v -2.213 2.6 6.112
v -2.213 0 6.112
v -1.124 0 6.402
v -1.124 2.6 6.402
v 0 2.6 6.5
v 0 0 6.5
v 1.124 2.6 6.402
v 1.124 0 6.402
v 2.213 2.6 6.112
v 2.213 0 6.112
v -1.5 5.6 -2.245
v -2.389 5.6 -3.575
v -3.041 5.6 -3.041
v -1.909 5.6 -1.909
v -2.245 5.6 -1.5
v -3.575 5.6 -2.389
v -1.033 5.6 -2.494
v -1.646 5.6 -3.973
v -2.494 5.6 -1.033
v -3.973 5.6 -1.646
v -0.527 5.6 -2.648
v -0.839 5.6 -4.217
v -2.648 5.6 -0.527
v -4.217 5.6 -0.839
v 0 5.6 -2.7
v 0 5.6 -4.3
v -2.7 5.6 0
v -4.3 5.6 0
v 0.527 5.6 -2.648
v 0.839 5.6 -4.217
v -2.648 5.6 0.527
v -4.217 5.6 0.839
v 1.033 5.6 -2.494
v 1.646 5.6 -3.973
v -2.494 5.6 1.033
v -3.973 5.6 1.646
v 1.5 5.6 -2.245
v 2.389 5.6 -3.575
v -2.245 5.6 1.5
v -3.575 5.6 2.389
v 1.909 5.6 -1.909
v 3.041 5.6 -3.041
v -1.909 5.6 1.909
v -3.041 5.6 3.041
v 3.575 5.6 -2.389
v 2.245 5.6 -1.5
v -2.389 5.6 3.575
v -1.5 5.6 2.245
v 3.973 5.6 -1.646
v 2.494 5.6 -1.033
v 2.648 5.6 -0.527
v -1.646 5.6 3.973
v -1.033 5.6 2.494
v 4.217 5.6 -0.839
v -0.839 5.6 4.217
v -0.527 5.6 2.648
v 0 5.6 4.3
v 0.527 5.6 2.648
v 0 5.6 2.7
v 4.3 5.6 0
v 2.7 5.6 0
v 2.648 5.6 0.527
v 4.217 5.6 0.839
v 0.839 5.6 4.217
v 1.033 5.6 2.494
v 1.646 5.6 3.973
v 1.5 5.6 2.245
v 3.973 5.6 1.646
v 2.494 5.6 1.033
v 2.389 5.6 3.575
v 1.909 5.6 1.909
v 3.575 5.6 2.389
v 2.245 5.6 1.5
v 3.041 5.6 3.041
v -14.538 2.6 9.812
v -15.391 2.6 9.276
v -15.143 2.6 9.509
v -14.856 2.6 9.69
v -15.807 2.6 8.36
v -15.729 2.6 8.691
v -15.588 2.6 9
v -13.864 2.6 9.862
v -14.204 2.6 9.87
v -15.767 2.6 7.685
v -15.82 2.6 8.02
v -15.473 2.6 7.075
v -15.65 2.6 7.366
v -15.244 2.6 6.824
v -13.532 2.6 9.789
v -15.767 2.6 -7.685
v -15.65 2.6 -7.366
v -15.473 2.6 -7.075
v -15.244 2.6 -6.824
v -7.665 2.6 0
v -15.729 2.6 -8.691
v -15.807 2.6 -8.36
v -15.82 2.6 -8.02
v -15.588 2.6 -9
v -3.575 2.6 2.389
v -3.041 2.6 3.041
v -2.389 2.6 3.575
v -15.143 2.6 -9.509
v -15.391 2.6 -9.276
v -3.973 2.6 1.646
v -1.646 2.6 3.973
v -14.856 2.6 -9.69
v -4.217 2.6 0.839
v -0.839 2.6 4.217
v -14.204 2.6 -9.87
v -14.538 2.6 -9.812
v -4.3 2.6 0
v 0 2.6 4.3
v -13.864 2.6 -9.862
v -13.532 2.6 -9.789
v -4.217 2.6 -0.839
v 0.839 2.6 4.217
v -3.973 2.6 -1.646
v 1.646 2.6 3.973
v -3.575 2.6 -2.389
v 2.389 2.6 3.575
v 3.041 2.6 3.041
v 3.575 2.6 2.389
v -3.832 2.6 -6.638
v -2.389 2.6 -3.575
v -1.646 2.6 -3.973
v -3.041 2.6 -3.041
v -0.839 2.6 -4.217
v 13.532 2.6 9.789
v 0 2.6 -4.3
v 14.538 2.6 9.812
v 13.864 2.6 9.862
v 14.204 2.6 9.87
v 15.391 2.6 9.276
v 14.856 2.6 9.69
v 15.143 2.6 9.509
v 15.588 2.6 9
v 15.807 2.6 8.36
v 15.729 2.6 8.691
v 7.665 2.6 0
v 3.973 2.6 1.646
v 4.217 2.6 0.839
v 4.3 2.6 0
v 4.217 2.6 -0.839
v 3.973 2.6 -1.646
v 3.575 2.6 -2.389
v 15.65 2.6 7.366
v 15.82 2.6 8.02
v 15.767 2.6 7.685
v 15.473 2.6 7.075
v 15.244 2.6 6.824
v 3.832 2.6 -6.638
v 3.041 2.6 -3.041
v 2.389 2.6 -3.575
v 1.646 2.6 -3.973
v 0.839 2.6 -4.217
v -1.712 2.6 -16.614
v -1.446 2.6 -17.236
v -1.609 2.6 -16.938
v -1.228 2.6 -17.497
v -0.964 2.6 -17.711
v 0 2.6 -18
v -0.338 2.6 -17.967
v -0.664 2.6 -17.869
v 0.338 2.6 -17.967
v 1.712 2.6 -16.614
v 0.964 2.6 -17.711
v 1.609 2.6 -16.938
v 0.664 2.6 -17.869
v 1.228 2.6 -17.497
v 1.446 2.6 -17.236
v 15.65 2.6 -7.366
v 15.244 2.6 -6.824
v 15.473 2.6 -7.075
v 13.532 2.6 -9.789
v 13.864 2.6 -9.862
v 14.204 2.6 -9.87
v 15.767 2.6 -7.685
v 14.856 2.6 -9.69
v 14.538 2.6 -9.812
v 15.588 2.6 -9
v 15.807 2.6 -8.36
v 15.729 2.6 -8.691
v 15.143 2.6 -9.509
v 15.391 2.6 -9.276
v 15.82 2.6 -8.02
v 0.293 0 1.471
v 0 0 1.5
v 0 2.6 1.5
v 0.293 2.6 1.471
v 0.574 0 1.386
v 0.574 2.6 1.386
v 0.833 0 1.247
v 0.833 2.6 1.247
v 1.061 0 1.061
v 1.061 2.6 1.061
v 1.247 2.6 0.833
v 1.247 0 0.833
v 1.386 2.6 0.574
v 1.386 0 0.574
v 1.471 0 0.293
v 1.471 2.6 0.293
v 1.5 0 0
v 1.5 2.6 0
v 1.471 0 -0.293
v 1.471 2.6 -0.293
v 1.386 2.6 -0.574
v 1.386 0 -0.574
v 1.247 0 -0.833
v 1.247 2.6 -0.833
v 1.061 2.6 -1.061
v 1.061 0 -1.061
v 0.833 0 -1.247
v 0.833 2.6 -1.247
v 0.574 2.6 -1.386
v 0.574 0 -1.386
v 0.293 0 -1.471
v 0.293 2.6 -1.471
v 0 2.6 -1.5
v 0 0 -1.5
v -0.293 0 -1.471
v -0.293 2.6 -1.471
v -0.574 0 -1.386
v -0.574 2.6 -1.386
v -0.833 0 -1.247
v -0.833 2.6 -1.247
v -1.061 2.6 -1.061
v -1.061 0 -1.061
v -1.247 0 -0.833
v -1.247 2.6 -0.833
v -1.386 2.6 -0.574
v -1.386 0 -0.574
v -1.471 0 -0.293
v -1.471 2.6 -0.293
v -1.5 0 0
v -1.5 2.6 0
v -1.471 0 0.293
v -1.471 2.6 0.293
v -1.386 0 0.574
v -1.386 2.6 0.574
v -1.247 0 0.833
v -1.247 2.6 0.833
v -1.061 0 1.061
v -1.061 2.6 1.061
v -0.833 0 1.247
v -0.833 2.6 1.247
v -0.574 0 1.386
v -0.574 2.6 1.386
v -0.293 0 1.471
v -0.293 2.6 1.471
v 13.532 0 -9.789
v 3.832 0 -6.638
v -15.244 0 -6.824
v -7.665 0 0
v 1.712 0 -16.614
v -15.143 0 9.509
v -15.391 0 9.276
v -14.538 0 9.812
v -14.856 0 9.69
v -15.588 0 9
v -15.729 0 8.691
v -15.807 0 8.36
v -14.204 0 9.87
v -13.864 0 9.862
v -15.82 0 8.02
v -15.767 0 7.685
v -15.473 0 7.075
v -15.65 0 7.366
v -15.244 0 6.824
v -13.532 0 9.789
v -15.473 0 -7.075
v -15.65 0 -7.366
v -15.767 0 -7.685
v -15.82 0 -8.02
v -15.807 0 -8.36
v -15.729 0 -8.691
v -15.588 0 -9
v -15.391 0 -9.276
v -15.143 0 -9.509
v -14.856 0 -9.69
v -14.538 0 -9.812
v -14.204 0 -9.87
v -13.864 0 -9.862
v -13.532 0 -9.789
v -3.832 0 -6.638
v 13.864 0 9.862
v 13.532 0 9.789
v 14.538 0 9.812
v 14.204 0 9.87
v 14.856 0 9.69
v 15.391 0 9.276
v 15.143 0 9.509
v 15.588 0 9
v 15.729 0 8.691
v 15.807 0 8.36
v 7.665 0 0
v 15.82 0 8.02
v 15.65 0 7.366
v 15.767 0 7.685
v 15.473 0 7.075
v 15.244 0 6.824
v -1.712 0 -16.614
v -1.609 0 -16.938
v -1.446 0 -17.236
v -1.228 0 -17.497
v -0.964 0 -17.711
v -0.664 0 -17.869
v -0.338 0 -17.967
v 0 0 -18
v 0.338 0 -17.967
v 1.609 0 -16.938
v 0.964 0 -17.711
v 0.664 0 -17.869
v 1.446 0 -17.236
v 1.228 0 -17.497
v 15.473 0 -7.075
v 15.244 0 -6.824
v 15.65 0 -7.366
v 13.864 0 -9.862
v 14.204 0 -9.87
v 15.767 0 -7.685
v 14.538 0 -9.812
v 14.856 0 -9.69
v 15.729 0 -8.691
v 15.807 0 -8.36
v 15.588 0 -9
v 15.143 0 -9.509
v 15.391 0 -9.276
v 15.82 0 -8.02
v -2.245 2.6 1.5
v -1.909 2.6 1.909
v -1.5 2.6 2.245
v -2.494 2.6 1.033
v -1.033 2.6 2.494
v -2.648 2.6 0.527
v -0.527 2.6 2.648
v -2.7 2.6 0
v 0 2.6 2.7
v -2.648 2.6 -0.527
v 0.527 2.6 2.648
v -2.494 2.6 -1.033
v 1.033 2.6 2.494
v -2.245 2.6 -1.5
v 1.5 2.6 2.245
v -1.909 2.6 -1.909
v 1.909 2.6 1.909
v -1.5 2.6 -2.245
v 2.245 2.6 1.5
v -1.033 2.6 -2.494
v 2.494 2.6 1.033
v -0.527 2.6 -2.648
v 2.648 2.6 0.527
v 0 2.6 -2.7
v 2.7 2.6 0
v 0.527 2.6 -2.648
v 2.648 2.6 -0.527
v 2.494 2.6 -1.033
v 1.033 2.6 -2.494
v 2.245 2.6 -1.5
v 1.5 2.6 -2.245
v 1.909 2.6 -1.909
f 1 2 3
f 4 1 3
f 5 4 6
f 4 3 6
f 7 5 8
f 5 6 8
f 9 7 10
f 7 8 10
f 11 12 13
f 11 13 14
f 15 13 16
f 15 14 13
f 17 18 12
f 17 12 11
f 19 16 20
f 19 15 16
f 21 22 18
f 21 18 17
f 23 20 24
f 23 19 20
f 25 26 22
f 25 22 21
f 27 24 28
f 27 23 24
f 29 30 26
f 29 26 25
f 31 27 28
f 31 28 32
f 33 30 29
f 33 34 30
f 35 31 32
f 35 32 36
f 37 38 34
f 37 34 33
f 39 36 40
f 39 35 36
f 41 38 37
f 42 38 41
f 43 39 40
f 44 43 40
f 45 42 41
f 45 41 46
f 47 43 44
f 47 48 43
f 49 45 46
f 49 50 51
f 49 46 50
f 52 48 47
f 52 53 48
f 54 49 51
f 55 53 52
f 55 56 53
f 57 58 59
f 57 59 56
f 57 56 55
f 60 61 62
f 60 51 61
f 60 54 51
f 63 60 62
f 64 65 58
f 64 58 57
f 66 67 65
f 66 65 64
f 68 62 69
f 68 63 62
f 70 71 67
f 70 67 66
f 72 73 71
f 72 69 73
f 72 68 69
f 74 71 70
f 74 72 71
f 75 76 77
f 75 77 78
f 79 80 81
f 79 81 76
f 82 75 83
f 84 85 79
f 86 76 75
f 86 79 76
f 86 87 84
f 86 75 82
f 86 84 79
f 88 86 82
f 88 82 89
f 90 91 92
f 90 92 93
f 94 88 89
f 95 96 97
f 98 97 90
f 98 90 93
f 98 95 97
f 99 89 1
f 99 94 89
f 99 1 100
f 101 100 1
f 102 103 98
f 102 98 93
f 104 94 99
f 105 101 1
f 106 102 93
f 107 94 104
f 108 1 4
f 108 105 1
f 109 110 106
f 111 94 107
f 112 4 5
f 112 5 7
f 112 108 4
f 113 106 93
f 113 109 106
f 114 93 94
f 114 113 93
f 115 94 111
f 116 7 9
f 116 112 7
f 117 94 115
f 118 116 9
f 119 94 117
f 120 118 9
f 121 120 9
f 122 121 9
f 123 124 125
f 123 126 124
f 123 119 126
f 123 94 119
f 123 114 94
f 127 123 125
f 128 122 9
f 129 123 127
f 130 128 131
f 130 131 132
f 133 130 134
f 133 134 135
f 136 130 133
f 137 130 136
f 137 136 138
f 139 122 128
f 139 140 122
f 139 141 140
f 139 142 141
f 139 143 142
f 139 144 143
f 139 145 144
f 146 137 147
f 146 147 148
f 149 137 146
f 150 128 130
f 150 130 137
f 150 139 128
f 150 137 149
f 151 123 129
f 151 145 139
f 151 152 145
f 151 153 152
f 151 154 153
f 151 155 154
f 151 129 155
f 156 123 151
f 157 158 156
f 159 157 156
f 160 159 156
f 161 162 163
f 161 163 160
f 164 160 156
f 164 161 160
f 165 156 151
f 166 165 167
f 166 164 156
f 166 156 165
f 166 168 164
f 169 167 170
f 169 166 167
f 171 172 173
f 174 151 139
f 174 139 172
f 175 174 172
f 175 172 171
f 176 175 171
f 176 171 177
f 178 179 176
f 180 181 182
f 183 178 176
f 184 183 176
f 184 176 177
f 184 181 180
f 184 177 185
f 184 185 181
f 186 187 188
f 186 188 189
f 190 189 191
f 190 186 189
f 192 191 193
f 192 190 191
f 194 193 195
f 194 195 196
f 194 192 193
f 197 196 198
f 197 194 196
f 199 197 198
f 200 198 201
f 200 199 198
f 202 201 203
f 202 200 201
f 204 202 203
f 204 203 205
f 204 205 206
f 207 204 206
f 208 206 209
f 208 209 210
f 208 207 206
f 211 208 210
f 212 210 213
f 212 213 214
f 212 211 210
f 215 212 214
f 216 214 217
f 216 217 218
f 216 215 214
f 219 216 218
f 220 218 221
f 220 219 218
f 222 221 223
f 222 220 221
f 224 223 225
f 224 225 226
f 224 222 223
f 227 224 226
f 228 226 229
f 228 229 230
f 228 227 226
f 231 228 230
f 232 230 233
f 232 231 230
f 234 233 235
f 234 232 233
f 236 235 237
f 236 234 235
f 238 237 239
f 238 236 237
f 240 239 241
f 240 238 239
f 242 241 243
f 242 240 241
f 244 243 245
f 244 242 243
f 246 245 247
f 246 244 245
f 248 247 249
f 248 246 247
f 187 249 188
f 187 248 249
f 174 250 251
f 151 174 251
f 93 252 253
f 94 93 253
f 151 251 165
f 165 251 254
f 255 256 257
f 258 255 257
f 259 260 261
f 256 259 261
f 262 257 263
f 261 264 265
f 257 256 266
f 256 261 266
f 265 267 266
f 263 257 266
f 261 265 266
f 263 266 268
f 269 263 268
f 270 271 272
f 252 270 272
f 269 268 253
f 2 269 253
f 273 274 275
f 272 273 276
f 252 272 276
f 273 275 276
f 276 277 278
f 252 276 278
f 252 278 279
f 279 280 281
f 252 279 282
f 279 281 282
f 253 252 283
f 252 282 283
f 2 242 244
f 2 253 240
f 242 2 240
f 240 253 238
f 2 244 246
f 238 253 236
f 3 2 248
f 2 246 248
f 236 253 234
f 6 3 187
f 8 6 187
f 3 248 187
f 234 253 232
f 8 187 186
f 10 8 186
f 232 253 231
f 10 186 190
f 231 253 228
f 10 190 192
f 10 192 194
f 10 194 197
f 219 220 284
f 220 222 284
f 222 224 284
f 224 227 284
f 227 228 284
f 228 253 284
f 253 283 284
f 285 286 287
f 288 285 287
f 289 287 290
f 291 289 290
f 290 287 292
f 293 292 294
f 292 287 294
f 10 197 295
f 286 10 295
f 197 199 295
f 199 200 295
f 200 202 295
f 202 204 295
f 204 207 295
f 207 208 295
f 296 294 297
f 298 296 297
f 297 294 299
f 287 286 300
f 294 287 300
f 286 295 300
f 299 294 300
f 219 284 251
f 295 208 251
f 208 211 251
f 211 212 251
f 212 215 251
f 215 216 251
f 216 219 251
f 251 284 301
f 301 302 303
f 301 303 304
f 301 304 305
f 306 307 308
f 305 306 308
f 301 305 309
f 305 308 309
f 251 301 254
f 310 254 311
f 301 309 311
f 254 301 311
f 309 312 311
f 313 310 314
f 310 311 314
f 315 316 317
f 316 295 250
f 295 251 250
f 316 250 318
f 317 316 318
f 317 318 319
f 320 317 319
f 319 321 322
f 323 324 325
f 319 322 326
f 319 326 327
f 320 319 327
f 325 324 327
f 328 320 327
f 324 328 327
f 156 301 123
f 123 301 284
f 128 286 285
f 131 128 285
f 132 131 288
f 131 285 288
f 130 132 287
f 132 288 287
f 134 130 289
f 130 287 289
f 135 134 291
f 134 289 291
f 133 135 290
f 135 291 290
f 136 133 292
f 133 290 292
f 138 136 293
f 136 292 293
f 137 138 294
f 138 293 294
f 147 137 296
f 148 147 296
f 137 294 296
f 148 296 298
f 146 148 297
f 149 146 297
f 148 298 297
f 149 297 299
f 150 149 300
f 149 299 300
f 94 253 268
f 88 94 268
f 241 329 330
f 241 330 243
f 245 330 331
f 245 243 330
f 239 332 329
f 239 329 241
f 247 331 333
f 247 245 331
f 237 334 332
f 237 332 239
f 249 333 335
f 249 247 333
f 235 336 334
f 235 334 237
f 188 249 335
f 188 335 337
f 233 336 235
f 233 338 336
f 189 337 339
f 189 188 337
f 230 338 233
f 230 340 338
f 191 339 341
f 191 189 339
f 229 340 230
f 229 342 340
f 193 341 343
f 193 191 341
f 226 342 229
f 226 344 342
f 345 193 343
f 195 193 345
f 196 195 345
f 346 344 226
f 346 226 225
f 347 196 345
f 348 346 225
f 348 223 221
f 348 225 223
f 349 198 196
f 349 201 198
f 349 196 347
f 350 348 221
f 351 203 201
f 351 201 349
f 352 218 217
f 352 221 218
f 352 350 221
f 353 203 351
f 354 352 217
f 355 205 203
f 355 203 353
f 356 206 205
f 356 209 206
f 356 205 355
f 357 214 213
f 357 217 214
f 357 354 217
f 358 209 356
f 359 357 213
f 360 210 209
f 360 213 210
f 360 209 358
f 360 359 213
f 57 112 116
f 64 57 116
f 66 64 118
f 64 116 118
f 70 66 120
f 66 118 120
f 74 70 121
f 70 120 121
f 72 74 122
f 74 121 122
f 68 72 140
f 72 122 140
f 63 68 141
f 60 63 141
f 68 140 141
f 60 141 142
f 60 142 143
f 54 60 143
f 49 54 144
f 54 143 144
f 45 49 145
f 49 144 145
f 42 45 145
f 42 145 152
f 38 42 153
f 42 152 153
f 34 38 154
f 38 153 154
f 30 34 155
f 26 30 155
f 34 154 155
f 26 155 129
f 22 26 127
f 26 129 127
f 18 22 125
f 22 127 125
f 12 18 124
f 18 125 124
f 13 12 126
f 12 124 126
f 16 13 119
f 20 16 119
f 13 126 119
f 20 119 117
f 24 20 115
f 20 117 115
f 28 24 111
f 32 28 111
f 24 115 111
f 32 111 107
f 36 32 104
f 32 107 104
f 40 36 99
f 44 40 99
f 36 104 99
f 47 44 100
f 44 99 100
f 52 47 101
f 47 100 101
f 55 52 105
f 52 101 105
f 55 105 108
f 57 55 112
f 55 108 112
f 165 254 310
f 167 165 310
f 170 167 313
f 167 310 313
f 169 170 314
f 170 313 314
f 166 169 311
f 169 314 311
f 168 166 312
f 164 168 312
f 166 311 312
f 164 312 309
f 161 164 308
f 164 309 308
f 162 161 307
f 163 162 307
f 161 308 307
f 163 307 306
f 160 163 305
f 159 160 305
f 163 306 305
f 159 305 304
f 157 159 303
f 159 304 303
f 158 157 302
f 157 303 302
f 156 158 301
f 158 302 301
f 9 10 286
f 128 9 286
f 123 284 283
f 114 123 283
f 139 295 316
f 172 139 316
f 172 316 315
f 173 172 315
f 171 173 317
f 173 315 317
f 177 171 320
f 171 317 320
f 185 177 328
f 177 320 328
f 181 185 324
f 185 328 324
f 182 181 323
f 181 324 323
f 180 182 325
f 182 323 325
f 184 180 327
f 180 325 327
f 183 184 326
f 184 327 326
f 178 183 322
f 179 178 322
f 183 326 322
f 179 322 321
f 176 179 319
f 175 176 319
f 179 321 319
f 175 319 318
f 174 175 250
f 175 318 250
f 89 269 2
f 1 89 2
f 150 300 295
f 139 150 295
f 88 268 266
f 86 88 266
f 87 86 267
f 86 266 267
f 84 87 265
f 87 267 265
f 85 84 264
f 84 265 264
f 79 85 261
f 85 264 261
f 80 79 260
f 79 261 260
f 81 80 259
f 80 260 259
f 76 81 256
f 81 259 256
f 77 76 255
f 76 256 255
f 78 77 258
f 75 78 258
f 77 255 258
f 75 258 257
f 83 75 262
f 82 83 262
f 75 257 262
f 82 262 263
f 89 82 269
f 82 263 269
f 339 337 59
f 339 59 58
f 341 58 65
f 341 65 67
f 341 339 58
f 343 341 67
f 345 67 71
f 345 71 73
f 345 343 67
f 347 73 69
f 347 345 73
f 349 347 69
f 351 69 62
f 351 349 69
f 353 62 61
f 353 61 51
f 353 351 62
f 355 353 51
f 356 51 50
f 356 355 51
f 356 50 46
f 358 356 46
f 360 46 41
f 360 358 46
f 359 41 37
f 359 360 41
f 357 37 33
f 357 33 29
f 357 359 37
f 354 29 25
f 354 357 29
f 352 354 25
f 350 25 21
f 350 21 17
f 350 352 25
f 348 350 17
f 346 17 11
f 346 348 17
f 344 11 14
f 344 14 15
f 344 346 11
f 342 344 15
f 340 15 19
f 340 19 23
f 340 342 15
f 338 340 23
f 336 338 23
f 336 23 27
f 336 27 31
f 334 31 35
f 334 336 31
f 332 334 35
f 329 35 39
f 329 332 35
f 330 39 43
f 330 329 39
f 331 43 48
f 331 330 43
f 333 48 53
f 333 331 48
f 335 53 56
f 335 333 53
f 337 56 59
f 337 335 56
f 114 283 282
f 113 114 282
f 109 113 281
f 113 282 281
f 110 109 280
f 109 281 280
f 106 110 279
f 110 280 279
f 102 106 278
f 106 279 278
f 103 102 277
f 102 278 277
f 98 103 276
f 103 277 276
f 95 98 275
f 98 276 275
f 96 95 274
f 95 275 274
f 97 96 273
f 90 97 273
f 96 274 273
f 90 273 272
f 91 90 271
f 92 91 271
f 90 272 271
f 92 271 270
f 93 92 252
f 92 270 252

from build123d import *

# Parameters (mm, degrees)
SKETCH1_R           = 1.5
BOSS_EXTRUDE1_DEPTH = 2.6
SKETCH2_R           = 4.3
SKETCH2_R_2         = 2.7
BOSS_EXTRUDE2_DEPTH = 3


with BuildPart() as part:
    # Sketch1 → Boss-Extrude1 (new body)
    with BuildSketch(Plane(origin=(0, 0, 0), x_dir=(1, 0, 0), z_dir=(0, 1, 0))):
        with BuildLine():
            Line((3.832260045, 6.637669106), (1.711758301, 16.613845459))
            ThreePointArc((1.711758301, 16.613845459), (0, 18), (-1.711758301, 16.613845459))
            Line((-1.711758301, 16.613845459), (-3.832260045, 6.637669106))
            Line((-3.832260045, 6.637669106), (-13.532133071, 9.789348904))
            ThreePointArc((-13.532133071, 9.789348904), (-15.588457268, 9), (-15.243891373, 6.824496555))
            Line((-15.243891373, 6.824496555), (-7.664520091, 0))
            Line((-7.664520091, 0), (-15.243891373, -6.824496555))
            ThreePointArc((-15.243891373, -6.824496555), (-15.588457268, -9), (-13.532133071, -9.789348904))
            Line((-13.532133071, -9.789348904), (-2.213204152, -6.111605957))
            ThreePointArc((-2.213204152, -6.111605957), (0, -6.5), (2.213204152, -6.111605957))
            Line((2.213204152, -6.111605957), (13.532133071, -9.789348904))
            ThreePointArc((13.532133071, -9.789348904), (15.588457268, -9), (15.243891373, -6.824496555))
            Line((15.243891373, -6.824496555), (7.664520091, 0))
            Line((7.664520091, 0), (15.243891373, 6.824496555))
            ThreePointArc((15.243891373, 6.824496555), (15.588457268, 9), (13.532133071, 9.789348904))
            Line((13.532133071, 9.789348904), (3.832260045, 6.637669106))
        make_face()
        with Locations(Location((0, 0, 0), (0, 0, 270))):
            Circle(SKETCH1_R, mode=Mode.SUBTRACT)
    extrude(amount=BOSS_EXTRUDE1_DEPTH)

    # Sketch2 → Boss-Extrude2 (add)
    with BuildSketch(Plane(origin=(0, 2.6, 0), x_dir=(1, 0, 0), z_dir=(0, 1, 0))):
        with Locations(Location((0, 0, 0), (0, 0, 270))):
            Circle(SKETCH2_R)
        with Locations(Location((0, 0, 0), (0, 0, 270))):
            Circle(SKETCH2_R_2, mode=Mode.SUBTRACT)
    extrude(amount=BOSS_EXTRUDE2_DEPTH)


solid = part.part
